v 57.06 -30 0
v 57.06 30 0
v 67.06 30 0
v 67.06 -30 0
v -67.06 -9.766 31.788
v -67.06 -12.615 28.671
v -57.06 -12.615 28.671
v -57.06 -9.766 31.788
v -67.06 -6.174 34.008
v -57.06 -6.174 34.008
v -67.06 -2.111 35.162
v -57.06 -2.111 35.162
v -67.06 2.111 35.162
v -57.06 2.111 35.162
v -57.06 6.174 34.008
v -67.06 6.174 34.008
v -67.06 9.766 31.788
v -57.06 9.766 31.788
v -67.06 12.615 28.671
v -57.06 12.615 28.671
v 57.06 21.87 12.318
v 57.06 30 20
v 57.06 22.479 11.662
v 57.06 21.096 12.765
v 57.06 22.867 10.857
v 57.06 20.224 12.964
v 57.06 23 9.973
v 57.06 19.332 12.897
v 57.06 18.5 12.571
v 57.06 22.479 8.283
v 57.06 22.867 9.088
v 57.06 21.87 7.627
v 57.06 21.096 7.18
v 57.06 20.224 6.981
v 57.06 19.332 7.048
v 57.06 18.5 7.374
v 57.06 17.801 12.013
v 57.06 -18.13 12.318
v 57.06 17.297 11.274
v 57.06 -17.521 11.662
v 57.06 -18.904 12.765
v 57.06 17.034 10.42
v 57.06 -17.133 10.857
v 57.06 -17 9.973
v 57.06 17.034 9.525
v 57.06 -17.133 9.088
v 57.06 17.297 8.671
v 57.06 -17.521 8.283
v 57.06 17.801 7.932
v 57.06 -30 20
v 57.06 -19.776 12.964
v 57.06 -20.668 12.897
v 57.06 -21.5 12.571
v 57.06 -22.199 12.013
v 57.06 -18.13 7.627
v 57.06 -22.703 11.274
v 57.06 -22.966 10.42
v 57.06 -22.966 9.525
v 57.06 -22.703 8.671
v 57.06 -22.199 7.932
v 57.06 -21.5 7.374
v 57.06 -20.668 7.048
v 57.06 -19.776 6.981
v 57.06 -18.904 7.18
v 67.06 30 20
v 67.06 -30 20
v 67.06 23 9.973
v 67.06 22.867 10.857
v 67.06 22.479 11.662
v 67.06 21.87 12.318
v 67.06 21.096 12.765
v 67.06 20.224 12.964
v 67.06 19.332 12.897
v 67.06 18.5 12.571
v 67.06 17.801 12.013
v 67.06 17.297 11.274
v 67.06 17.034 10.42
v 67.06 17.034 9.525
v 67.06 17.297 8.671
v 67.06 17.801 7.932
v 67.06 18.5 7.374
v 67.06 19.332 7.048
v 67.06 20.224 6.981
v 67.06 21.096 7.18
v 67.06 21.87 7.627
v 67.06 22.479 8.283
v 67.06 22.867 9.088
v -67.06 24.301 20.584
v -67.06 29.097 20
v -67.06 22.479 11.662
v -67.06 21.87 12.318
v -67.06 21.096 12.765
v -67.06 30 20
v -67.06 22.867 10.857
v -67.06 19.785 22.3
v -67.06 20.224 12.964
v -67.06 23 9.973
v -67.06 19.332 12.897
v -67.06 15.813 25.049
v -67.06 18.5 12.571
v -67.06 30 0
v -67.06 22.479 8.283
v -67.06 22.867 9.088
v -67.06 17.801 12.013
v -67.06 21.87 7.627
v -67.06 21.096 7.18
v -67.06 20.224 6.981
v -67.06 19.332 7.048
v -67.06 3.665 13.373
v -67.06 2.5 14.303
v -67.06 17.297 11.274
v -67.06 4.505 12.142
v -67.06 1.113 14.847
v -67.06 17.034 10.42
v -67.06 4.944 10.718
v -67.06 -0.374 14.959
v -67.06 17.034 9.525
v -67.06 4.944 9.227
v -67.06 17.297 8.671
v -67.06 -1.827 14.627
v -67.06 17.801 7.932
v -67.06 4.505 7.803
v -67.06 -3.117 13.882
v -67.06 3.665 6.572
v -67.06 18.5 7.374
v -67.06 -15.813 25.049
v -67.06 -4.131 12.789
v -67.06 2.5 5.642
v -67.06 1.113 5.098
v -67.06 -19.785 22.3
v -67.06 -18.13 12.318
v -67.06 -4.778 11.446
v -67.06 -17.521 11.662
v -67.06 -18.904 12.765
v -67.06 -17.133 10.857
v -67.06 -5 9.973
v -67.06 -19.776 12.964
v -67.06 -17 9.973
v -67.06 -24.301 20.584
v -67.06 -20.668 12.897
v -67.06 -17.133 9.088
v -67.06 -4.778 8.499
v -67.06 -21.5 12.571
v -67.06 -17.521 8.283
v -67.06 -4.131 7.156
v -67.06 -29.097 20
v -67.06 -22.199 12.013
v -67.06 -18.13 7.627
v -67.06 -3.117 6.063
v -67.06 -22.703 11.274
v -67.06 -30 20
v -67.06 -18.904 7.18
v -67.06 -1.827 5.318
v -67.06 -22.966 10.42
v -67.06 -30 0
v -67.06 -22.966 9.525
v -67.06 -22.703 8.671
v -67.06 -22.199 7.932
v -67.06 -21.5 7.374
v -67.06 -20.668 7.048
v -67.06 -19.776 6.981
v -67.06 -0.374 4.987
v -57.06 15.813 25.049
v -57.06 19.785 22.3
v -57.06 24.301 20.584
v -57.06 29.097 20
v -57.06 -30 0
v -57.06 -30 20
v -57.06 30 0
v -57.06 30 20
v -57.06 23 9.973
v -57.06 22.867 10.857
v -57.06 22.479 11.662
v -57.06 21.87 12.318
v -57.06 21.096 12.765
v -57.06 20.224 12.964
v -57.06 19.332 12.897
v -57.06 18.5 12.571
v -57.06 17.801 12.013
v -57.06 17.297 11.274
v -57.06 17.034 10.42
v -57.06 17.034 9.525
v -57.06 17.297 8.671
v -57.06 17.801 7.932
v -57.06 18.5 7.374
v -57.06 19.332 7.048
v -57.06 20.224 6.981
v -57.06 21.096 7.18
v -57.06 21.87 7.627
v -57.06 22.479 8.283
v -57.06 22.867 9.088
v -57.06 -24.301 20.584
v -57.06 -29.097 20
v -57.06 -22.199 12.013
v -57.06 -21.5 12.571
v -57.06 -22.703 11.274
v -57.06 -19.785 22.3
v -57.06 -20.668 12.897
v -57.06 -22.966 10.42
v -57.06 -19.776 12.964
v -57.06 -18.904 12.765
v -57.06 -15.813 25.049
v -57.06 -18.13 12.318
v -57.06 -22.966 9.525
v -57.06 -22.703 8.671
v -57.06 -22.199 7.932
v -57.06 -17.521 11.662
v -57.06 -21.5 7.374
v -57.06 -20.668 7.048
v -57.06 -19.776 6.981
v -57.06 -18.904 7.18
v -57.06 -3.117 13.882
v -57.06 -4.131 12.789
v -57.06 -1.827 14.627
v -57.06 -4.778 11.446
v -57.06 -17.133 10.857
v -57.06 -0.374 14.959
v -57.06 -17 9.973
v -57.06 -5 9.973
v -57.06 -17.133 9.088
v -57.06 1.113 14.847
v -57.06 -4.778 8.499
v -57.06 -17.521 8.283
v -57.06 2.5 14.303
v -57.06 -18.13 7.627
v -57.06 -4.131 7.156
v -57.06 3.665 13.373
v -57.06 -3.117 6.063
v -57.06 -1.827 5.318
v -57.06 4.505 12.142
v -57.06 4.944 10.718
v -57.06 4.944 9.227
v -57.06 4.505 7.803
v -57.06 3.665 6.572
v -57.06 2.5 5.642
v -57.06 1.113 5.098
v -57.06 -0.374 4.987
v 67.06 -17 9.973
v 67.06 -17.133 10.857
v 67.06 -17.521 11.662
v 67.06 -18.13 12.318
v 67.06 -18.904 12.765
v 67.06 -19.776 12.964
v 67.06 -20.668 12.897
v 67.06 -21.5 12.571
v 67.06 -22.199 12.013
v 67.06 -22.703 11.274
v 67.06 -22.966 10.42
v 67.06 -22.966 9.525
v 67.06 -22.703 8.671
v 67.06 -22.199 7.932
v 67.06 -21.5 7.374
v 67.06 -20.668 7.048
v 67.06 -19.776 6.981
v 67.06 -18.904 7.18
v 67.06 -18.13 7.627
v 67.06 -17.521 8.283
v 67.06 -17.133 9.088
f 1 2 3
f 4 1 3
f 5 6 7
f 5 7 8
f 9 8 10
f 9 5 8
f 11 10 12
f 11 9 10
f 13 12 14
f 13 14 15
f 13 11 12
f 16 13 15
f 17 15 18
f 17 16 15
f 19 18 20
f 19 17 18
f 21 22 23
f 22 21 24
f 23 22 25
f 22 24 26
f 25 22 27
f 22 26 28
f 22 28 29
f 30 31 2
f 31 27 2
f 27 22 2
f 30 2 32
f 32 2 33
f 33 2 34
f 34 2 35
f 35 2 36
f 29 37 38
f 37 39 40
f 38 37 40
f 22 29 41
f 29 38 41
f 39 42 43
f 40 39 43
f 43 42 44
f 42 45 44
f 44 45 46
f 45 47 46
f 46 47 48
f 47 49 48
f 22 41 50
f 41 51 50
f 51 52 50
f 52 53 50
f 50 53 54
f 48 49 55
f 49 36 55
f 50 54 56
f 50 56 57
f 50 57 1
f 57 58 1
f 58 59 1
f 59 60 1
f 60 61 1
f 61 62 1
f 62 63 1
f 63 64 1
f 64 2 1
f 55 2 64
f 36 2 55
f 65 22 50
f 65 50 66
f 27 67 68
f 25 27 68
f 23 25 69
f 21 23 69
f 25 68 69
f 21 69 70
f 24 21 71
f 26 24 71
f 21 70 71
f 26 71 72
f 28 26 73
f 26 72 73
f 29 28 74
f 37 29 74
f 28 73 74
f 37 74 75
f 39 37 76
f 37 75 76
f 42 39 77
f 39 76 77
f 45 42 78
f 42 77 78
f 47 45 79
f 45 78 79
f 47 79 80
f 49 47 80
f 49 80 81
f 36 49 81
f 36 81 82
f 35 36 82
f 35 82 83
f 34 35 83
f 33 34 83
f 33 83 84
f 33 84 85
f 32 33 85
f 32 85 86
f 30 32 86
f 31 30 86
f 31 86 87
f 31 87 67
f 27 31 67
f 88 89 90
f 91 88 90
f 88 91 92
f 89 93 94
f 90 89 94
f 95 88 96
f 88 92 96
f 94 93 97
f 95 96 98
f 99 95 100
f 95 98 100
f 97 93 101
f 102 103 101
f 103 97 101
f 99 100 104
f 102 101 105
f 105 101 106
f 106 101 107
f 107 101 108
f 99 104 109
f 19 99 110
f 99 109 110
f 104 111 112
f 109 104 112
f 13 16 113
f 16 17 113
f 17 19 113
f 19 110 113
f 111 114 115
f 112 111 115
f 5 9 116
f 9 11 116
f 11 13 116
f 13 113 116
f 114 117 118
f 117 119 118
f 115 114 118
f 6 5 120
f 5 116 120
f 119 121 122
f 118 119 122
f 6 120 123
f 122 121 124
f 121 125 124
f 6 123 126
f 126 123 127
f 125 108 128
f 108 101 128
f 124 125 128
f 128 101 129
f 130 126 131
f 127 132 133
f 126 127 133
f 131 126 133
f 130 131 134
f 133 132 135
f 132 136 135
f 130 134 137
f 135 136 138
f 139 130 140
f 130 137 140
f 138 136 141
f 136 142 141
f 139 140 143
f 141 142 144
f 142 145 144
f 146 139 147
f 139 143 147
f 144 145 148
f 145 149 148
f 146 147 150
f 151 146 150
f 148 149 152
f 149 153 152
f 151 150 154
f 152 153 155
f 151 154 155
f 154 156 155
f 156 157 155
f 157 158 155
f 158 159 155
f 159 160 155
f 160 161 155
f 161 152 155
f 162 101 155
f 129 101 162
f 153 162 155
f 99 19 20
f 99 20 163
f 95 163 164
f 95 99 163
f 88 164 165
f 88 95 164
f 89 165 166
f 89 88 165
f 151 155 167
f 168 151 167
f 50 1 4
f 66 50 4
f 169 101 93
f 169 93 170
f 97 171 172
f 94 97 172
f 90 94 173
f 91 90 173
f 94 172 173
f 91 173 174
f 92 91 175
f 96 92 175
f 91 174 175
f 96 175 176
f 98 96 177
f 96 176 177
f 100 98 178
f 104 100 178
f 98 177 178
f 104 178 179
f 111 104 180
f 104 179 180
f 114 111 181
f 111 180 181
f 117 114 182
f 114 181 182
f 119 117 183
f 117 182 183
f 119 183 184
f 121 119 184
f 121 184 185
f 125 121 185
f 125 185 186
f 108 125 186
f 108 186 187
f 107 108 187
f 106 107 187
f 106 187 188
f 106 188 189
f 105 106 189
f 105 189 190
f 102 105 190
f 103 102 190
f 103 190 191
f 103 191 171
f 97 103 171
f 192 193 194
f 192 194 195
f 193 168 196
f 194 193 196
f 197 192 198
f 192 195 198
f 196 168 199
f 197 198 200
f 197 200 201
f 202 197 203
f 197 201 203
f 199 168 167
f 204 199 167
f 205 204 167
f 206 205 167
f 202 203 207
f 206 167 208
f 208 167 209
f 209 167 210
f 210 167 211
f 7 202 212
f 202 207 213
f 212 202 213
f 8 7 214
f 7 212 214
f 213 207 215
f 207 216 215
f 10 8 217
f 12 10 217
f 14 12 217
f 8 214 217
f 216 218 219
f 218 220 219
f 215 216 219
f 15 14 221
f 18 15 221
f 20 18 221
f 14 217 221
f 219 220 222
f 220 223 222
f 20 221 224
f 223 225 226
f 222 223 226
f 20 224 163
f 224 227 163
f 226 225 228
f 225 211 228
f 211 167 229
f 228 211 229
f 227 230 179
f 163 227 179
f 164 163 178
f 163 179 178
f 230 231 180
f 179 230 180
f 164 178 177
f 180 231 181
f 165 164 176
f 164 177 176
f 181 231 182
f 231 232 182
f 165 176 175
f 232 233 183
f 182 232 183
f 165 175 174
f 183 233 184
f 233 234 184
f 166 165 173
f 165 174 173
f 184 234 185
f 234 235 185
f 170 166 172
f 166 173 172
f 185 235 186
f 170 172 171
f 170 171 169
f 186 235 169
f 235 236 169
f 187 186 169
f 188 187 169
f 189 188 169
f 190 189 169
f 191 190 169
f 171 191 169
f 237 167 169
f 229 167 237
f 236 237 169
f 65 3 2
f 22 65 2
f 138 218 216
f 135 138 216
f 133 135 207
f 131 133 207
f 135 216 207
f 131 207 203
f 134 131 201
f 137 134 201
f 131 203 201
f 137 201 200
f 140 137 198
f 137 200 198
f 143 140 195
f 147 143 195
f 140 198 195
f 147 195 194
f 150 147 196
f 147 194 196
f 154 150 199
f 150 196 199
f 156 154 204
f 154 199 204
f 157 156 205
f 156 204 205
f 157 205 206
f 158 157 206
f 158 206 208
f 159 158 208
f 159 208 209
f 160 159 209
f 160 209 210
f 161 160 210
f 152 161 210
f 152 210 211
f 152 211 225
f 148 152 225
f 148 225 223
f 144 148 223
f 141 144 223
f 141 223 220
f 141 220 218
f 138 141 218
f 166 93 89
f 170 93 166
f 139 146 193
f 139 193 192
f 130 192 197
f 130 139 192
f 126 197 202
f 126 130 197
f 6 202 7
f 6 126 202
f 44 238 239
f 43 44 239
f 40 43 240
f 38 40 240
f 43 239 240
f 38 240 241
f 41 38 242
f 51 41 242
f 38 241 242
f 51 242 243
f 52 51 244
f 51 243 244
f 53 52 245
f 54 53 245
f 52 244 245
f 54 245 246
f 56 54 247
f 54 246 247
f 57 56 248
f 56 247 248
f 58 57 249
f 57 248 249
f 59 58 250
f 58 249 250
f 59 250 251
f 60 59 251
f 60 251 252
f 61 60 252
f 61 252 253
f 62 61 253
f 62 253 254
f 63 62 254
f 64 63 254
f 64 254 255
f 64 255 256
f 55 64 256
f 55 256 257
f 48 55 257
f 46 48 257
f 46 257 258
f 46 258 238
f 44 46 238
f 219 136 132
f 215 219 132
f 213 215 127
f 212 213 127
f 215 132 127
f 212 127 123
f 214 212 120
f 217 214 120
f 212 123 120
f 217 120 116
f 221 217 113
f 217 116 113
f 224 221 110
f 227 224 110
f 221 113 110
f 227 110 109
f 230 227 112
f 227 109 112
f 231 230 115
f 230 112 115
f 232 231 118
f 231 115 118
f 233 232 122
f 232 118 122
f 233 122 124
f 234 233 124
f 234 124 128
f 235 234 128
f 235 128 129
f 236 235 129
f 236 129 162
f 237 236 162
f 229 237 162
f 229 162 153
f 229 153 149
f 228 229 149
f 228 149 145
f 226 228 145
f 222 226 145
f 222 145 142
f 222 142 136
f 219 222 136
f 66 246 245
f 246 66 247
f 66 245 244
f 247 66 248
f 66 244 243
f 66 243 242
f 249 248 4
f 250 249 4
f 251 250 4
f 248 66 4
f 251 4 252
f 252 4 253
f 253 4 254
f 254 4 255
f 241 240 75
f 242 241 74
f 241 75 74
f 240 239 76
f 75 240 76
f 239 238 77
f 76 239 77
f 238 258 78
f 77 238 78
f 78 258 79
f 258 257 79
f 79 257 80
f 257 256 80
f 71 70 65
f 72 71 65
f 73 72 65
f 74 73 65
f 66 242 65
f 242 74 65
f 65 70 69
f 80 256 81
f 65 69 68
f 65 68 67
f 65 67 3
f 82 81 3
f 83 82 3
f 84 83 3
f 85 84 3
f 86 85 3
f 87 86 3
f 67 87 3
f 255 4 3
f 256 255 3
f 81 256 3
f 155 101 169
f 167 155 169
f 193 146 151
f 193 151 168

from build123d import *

# Parameters (mm, degrees)
F0_W     = 10
F0_H     = 30
F1_DEPTH = 20
F2_R     = 3
F3_DEPTH = 175
F5_DEPTH = 10
F6_R     = 5
F7_DEPTH = 31.6


with BuildPart() as f1:
    # F0 (on Top) → F1 (new body)
    with BuildSketch(Plane.XY):
        with Locations((-62.0596675936, 15)):
            Rectangle(F0_W, F0_H)
        with Locations((-62.0596675936, -15)):
            Rectangle(F0_W, F0_H)
    extrude(amount=F1_DEPTH)


with BuildPart() as f1b:
    # F0 (on Top) → F1, piece 2 (new body)
    with BuildSketch(Plane.XY):
        Polygon((67.0596675936, 0), (67.0596675936, 30), (57.0596675936, 30), (57.0596675936, 0), (57.0596675936, -30), (67.0596675936, -30), align=None)
    extrude(amount=F1_DEPTH)


with BuildPart() as f3_tool:
    # F2 (on face) → F3 (new body)
    with BuildSketch(Plane.YZ.offset(67.0596675936)):
        with Locations((20, 9.9725276232)):
            Circle(F2_R)
        with Locations((-20, 9.9725276232)):
            Circle(F2_R)
    extrude(amount=-F3_DEPTH)


with BuildPart() as f1_1:
    add(f1.part)

    # F3: cut by f3_tool
    add(f3_tool.part, mode=Mode.SUBTRACT)

    # F4 (on face) → F5 (join, through all)
    with BuildSketch(Plane(origin=(-67.0596675936, 0, 0), x_dir=(0, -1, 0), z_dir=(-1, 0, 0))):
        with BuildLine():
            ThreePointArc((29.0973204207, 20), (19.7854360685, 22.3000336212), (12.6153164249, 28.6711190189))
            ThreePointArc((12.6153164249, 28.6711190189), (0, 35.3079885531), (-12.6153164249, 28.6711190189))
            ThreePointArc((-12.6153164249, 28.6711190189), (-19.7854360685, 22.3000336212), (-29.0973204207, 20))
            Line((-29.0973204207, 20), (29.0973204207, 20))
        make_face()
    extrude(amount=-F5_DEPTH)

    # F6 (on face) → F7 (cut)
    with BuildSketch(Plane(origin=(-67.0596675936, 0, 0), x_dir=(0, -1, 0), z_dir=(-1, 0, 0))):
        with Locations((0, 9.9725276232)):
            Circle(F6_R)
    extrude(amount=-F7_DEPTH, mode=Mode.SUBTRACT)


with BuildPart() as f1b_1:
    add(f1b.part)

    # F3: cut by f3_tool
    add(f3_tool.part, mode=Mode.SUBTRACT)


solid = Compound([f1_1.part, f1b_1.part])
